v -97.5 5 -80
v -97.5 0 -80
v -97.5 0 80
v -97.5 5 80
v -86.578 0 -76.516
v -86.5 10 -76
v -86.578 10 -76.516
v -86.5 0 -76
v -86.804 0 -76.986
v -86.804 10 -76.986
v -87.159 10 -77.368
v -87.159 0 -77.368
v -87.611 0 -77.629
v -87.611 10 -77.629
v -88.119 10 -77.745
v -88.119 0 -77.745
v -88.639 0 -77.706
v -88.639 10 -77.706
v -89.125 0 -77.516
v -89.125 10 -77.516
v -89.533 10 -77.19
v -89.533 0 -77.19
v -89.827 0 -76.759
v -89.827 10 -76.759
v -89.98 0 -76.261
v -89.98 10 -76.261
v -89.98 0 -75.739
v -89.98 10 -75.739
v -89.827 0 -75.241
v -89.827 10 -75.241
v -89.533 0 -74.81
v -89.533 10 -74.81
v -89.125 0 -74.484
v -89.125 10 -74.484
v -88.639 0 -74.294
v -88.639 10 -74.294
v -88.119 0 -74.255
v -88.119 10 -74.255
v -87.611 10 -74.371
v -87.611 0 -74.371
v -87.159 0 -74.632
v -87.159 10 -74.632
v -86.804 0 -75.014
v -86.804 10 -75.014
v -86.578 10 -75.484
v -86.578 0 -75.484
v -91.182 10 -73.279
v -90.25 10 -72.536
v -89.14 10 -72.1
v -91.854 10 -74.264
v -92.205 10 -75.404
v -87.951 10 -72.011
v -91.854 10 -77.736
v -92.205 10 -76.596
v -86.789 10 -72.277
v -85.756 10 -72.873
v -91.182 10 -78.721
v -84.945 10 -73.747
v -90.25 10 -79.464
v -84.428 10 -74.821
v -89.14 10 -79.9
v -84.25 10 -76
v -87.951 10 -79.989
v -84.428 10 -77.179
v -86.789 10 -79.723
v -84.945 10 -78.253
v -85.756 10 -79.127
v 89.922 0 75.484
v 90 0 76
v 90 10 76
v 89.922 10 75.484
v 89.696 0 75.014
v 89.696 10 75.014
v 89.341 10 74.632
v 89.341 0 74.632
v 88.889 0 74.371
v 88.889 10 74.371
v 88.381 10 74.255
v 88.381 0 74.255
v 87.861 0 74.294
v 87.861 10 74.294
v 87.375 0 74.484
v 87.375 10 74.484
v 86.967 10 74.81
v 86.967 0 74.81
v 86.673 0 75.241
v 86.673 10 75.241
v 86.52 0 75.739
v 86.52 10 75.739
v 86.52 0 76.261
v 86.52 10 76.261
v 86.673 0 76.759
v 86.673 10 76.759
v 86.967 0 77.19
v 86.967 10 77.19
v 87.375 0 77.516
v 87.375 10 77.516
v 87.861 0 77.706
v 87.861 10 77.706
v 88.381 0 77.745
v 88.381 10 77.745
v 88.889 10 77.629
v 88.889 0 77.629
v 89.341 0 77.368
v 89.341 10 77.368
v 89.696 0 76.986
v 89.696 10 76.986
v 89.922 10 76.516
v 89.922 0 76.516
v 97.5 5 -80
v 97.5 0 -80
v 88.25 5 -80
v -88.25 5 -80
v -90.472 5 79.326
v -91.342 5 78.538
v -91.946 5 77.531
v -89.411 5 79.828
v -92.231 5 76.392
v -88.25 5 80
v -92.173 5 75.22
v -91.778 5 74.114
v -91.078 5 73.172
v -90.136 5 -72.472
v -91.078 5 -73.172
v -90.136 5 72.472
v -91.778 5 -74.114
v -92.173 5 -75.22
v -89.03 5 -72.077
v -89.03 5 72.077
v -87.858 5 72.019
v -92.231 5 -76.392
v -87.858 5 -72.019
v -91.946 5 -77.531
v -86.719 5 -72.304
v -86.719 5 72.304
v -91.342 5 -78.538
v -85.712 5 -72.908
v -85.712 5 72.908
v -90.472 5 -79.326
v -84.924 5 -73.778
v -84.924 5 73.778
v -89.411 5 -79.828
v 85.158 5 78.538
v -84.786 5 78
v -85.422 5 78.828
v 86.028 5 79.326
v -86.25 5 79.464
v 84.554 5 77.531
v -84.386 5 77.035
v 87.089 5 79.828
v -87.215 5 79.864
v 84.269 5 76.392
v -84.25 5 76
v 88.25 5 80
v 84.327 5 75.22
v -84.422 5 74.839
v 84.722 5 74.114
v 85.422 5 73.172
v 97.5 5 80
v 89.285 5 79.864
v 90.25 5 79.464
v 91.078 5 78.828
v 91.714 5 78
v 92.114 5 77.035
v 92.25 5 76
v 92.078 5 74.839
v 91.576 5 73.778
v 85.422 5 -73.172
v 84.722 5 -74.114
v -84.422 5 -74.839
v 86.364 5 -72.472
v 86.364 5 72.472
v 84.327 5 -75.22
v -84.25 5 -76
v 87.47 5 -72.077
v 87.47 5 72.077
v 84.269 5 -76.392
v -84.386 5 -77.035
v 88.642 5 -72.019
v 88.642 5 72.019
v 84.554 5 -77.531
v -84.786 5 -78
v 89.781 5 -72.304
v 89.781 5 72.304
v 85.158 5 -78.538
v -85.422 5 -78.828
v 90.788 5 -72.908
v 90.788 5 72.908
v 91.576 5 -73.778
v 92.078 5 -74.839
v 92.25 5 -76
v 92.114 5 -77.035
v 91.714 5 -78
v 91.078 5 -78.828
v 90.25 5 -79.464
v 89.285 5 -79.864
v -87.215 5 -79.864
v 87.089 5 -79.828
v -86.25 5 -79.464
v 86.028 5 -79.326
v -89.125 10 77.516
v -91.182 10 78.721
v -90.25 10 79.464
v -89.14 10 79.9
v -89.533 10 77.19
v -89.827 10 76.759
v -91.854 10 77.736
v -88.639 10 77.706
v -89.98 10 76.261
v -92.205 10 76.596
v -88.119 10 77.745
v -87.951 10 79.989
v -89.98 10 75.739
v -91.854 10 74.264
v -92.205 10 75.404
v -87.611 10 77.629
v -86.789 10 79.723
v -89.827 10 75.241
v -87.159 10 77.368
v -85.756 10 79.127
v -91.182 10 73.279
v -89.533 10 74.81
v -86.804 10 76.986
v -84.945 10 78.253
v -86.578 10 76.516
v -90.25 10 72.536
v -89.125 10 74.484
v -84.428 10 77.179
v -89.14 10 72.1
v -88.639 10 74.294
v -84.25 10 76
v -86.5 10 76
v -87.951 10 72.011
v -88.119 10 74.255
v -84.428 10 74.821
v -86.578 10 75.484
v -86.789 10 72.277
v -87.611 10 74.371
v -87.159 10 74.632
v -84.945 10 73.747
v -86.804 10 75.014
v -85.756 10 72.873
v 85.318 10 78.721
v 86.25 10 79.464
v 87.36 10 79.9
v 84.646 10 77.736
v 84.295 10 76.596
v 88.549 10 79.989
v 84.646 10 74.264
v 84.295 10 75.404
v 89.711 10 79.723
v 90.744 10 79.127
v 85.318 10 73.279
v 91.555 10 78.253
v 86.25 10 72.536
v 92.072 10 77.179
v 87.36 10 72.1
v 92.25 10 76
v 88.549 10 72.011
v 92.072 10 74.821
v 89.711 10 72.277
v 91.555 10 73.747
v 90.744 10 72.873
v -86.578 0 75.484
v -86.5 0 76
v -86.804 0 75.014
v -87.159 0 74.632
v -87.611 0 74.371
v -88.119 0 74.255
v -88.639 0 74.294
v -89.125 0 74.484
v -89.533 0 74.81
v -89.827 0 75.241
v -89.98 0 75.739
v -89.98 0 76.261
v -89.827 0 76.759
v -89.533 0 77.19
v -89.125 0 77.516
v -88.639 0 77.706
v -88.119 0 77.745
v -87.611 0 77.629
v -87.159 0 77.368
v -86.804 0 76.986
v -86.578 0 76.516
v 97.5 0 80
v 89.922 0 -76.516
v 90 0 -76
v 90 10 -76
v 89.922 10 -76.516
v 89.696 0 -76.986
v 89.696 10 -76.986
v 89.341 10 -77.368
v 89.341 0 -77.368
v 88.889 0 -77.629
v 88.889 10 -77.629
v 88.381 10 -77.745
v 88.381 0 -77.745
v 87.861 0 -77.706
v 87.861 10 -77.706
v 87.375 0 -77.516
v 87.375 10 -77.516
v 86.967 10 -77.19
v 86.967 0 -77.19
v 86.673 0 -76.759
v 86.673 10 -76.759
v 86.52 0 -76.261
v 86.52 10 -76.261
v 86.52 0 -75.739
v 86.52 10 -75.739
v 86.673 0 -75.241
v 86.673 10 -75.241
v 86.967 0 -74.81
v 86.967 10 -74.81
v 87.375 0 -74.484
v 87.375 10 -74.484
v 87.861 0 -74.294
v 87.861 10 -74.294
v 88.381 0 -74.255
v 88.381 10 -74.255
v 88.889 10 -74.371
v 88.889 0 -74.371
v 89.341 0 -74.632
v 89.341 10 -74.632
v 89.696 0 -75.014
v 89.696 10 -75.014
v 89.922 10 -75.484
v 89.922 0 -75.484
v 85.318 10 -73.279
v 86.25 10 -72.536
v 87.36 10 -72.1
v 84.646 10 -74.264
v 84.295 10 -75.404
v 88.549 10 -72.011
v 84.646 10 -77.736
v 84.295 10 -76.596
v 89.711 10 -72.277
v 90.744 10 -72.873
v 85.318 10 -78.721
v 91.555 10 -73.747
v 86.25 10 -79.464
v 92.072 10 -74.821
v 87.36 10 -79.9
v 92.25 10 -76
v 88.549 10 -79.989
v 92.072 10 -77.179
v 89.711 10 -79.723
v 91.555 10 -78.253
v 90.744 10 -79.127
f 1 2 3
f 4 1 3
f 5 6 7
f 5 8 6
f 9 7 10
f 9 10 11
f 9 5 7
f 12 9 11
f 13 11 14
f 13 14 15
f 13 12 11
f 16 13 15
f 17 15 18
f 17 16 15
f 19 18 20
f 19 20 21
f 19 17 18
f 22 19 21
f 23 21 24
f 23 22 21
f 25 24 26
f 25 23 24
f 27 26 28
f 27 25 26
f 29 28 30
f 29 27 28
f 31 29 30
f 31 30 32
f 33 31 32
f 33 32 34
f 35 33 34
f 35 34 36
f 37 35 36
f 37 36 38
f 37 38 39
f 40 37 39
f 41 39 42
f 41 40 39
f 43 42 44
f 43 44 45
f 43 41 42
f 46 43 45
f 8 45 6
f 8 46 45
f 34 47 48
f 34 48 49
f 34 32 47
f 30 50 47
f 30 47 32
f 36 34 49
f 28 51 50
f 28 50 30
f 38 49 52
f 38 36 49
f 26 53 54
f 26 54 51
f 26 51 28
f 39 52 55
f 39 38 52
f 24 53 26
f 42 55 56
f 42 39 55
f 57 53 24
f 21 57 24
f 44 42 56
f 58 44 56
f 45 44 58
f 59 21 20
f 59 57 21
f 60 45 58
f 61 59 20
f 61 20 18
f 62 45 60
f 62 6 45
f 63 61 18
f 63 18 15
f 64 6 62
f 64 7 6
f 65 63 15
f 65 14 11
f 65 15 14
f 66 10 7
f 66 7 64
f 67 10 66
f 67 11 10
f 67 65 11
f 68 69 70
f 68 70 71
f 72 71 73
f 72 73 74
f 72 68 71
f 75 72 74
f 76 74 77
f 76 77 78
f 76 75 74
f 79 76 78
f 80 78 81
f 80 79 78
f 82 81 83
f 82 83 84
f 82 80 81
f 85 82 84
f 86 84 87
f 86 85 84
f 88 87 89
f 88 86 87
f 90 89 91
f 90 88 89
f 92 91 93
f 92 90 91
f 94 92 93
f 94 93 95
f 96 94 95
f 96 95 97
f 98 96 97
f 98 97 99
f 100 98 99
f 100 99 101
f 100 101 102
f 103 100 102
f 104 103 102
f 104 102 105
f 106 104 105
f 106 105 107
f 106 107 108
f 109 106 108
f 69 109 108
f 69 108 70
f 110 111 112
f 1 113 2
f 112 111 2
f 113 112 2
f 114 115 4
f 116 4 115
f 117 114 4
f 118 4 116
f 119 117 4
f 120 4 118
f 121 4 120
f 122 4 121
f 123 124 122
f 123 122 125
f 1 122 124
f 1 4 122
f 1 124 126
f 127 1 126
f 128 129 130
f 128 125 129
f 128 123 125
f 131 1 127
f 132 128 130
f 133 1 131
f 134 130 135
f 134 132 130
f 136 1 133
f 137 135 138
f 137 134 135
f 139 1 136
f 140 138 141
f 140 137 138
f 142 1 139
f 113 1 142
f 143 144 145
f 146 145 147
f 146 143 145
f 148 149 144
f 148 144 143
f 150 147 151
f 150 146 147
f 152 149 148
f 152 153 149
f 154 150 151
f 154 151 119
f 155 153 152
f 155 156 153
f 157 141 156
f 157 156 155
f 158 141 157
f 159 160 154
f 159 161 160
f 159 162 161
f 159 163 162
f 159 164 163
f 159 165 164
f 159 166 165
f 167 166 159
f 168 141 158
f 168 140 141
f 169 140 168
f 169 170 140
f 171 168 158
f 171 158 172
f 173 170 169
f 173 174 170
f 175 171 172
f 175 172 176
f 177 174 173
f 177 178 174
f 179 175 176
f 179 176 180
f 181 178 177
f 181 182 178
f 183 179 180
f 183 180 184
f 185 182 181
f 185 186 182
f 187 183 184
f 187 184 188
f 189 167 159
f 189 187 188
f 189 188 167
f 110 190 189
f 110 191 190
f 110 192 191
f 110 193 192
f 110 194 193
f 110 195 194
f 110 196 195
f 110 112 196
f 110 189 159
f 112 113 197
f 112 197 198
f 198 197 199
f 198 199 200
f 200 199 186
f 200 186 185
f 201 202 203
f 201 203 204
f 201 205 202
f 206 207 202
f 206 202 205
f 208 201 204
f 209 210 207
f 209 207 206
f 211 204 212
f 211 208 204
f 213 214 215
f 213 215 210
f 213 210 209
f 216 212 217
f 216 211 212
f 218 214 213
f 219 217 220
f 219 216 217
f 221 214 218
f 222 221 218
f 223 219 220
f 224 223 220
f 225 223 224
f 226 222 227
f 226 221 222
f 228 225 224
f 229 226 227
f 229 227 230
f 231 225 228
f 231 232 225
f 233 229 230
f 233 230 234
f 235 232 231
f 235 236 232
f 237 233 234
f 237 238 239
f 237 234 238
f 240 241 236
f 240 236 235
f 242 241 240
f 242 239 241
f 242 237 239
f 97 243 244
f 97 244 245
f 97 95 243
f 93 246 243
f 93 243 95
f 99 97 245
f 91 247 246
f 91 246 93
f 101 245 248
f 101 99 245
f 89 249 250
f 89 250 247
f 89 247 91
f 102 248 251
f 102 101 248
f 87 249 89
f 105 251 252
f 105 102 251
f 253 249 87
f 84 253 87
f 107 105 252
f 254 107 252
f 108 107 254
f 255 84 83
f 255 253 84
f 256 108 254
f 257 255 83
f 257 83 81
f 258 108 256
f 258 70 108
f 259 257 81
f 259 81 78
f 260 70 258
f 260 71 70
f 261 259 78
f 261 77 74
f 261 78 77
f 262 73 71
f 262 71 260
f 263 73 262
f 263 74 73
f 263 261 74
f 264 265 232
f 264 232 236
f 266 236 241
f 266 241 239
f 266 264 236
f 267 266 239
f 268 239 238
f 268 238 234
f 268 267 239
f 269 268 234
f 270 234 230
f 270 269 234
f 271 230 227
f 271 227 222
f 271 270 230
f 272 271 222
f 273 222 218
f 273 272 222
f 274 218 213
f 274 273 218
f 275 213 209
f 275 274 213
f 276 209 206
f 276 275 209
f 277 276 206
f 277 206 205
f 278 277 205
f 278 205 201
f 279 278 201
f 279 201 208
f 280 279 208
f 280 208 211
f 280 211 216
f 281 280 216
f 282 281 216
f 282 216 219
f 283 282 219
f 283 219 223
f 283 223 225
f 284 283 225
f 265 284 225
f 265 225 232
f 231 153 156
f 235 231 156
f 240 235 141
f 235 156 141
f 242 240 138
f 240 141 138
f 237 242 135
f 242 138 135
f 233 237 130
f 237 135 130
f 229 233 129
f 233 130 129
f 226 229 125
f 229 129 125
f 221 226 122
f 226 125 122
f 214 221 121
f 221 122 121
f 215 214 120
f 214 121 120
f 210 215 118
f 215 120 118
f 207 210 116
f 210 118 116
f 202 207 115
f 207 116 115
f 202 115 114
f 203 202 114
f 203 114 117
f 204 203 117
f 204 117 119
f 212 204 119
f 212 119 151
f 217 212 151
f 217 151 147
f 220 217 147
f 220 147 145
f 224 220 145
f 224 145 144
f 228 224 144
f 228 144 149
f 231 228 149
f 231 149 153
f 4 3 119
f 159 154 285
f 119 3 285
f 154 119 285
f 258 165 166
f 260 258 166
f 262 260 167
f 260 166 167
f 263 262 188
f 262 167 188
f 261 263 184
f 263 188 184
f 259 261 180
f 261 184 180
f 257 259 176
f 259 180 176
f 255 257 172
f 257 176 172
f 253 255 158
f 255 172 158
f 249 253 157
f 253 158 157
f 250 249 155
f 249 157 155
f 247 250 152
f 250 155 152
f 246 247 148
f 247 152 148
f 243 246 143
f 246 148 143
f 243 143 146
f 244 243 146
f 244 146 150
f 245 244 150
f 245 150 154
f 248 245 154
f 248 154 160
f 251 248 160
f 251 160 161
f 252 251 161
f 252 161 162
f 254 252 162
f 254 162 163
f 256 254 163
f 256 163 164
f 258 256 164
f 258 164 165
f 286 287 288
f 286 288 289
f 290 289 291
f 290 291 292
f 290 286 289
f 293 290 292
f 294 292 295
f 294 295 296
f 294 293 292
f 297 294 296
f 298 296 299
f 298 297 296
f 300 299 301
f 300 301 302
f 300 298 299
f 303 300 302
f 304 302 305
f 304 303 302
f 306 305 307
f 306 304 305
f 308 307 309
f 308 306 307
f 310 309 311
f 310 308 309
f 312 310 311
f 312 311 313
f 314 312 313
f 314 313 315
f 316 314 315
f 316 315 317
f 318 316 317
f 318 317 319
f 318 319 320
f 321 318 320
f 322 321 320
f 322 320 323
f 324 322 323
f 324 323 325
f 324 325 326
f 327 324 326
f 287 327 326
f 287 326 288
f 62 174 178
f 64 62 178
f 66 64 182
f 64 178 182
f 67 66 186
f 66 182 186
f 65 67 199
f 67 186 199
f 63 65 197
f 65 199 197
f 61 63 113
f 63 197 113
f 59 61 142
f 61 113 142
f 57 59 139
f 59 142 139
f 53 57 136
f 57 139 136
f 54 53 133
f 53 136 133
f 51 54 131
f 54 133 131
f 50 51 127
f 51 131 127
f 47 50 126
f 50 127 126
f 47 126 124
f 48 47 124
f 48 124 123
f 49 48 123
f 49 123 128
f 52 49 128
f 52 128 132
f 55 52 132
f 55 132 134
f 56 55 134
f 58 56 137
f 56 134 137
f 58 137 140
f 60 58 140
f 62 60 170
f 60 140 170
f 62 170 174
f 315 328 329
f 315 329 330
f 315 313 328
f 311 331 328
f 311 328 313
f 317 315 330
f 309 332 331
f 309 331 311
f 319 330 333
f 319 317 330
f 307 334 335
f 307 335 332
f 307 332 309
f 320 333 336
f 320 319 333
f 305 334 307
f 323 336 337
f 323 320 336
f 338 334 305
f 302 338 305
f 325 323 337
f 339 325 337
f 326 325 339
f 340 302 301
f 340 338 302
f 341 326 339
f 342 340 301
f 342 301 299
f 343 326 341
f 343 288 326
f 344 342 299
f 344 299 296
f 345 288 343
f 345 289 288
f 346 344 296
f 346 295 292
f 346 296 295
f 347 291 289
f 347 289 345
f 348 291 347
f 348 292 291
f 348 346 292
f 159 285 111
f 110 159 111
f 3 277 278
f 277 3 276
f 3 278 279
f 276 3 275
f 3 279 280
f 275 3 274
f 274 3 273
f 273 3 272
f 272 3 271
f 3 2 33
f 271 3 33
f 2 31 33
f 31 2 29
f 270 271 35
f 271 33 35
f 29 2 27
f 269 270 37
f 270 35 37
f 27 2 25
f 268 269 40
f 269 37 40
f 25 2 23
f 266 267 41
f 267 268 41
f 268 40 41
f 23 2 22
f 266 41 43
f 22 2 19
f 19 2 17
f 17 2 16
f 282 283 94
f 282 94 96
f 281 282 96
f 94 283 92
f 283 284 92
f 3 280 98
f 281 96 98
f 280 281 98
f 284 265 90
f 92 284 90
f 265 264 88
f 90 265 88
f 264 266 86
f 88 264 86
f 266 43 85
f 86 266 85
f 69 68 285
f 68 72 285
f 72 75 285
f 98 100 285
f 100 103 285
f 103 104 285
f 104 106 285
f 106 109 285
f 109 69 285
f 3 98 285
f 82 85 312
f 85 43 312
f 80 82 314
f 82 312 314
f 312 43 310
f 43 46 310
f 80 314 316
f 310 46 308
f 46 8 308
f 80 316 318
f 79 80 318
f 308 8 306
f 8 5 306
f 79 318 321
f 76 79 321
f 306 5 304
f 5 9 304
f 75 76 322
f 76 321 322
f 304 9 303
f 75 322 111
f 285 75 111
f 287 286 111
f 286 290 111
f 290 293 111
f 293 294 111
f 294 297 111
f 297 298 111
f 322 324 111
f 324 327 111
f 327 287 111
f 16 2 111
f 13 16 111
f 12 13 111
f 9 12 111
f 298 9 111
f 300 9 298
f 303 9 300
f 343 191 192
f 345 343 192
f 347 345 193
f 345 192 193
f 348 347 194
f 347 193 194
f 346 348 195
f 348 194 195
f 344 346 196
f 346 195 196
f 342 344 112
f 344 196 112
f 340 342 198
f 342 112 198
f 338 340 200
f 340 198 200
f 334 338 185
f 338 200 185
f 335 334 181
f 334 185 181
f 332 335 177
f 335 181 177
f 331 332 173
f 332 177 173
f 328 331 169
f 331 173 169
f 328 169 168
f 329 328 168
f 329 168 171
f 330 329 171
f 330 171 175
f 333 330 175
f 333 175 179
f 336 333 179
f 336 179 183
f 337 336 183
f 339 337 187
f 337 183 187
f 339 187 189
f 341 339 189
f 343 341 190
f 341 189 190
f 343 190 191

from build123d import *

# Parameters (mm, degrees)
SKETCH1_R           = 1.75
BOSS_EXTRUDE1_DEPTH = 5
SKETCH2_R           = 4
SKETCH2_R_2         = 1.75
BOSS_EXTRUDE2_DEPTH = 5


with BuildPart() as part:
    # Sketch1 → Boss-Extrude1 (new body)
    with BuildSketch(Plane(origin=(0, 0, 0), x_dir=(1, 0, 0), z_dir=(0, 1, 0))):
        Polygon((-92.5, -80), (92.5, -80), (97.5, -80), (97.5, 80), (92.5, 80), (-92.5, 80), (-97.5, 80), (-97.5, -80), align=None)
        with Locations((-88.25, 76)):
            Circle(SKETCH1_R, mode=Mode.SUBTRACT)
        with Locations((88.25, 76)):
            Circle(SKETCH1_R, mode=Mode.SUBTRACT)
        with Locations((88.25, -76)):
            Circle(SKETCH1_R, mode=Mode.SUBTRACT)
        with Locations((-88.25, -76)):
            Circle(SKETCH1_R, mode=Mode.SUBTRACT)
    extrude(amount=BOSS_EXTRUDE1_DEPTH)

    # Sketch2 → Boss-Extrude2 (add)
    with BuildSketch(Plane(origin=(0, 5, 0), x_dir=(1, 0, 0), z_dir=(0, 1, 0))):
        with Locations((-88.25, 76)):
            Circle(SKETCH2_R)
        with Locations((-88.25, 76)):
            Circle(SKETCH2_R_2, mode=Mode.SUBTRACT)
        with Locations((88.25, 76)):
            Circle(SKETCH2_R)
        with Locations((88.25, 76)):
            Circle(SKETCH2_R_2, mode=Mode.SUBTRACT)
        with Locations((88.25, -76)):
            Circle(SKETCH2_R)
        with Locations((88.25, -76)):
            Circle(SKETCH2_R_2, mode=Mode.SUBTRACT)
        with Locations((-88.25, -76)):
            Circle(SKETCH2_R)
        with Locations((-88.25, -76)):
            Circle(SKETCH2_R_2, mode=Mode.SUBTRACT)
    extrude(amount=BOSS_EXTRUDE2_DEPTH)


solid = part.part
